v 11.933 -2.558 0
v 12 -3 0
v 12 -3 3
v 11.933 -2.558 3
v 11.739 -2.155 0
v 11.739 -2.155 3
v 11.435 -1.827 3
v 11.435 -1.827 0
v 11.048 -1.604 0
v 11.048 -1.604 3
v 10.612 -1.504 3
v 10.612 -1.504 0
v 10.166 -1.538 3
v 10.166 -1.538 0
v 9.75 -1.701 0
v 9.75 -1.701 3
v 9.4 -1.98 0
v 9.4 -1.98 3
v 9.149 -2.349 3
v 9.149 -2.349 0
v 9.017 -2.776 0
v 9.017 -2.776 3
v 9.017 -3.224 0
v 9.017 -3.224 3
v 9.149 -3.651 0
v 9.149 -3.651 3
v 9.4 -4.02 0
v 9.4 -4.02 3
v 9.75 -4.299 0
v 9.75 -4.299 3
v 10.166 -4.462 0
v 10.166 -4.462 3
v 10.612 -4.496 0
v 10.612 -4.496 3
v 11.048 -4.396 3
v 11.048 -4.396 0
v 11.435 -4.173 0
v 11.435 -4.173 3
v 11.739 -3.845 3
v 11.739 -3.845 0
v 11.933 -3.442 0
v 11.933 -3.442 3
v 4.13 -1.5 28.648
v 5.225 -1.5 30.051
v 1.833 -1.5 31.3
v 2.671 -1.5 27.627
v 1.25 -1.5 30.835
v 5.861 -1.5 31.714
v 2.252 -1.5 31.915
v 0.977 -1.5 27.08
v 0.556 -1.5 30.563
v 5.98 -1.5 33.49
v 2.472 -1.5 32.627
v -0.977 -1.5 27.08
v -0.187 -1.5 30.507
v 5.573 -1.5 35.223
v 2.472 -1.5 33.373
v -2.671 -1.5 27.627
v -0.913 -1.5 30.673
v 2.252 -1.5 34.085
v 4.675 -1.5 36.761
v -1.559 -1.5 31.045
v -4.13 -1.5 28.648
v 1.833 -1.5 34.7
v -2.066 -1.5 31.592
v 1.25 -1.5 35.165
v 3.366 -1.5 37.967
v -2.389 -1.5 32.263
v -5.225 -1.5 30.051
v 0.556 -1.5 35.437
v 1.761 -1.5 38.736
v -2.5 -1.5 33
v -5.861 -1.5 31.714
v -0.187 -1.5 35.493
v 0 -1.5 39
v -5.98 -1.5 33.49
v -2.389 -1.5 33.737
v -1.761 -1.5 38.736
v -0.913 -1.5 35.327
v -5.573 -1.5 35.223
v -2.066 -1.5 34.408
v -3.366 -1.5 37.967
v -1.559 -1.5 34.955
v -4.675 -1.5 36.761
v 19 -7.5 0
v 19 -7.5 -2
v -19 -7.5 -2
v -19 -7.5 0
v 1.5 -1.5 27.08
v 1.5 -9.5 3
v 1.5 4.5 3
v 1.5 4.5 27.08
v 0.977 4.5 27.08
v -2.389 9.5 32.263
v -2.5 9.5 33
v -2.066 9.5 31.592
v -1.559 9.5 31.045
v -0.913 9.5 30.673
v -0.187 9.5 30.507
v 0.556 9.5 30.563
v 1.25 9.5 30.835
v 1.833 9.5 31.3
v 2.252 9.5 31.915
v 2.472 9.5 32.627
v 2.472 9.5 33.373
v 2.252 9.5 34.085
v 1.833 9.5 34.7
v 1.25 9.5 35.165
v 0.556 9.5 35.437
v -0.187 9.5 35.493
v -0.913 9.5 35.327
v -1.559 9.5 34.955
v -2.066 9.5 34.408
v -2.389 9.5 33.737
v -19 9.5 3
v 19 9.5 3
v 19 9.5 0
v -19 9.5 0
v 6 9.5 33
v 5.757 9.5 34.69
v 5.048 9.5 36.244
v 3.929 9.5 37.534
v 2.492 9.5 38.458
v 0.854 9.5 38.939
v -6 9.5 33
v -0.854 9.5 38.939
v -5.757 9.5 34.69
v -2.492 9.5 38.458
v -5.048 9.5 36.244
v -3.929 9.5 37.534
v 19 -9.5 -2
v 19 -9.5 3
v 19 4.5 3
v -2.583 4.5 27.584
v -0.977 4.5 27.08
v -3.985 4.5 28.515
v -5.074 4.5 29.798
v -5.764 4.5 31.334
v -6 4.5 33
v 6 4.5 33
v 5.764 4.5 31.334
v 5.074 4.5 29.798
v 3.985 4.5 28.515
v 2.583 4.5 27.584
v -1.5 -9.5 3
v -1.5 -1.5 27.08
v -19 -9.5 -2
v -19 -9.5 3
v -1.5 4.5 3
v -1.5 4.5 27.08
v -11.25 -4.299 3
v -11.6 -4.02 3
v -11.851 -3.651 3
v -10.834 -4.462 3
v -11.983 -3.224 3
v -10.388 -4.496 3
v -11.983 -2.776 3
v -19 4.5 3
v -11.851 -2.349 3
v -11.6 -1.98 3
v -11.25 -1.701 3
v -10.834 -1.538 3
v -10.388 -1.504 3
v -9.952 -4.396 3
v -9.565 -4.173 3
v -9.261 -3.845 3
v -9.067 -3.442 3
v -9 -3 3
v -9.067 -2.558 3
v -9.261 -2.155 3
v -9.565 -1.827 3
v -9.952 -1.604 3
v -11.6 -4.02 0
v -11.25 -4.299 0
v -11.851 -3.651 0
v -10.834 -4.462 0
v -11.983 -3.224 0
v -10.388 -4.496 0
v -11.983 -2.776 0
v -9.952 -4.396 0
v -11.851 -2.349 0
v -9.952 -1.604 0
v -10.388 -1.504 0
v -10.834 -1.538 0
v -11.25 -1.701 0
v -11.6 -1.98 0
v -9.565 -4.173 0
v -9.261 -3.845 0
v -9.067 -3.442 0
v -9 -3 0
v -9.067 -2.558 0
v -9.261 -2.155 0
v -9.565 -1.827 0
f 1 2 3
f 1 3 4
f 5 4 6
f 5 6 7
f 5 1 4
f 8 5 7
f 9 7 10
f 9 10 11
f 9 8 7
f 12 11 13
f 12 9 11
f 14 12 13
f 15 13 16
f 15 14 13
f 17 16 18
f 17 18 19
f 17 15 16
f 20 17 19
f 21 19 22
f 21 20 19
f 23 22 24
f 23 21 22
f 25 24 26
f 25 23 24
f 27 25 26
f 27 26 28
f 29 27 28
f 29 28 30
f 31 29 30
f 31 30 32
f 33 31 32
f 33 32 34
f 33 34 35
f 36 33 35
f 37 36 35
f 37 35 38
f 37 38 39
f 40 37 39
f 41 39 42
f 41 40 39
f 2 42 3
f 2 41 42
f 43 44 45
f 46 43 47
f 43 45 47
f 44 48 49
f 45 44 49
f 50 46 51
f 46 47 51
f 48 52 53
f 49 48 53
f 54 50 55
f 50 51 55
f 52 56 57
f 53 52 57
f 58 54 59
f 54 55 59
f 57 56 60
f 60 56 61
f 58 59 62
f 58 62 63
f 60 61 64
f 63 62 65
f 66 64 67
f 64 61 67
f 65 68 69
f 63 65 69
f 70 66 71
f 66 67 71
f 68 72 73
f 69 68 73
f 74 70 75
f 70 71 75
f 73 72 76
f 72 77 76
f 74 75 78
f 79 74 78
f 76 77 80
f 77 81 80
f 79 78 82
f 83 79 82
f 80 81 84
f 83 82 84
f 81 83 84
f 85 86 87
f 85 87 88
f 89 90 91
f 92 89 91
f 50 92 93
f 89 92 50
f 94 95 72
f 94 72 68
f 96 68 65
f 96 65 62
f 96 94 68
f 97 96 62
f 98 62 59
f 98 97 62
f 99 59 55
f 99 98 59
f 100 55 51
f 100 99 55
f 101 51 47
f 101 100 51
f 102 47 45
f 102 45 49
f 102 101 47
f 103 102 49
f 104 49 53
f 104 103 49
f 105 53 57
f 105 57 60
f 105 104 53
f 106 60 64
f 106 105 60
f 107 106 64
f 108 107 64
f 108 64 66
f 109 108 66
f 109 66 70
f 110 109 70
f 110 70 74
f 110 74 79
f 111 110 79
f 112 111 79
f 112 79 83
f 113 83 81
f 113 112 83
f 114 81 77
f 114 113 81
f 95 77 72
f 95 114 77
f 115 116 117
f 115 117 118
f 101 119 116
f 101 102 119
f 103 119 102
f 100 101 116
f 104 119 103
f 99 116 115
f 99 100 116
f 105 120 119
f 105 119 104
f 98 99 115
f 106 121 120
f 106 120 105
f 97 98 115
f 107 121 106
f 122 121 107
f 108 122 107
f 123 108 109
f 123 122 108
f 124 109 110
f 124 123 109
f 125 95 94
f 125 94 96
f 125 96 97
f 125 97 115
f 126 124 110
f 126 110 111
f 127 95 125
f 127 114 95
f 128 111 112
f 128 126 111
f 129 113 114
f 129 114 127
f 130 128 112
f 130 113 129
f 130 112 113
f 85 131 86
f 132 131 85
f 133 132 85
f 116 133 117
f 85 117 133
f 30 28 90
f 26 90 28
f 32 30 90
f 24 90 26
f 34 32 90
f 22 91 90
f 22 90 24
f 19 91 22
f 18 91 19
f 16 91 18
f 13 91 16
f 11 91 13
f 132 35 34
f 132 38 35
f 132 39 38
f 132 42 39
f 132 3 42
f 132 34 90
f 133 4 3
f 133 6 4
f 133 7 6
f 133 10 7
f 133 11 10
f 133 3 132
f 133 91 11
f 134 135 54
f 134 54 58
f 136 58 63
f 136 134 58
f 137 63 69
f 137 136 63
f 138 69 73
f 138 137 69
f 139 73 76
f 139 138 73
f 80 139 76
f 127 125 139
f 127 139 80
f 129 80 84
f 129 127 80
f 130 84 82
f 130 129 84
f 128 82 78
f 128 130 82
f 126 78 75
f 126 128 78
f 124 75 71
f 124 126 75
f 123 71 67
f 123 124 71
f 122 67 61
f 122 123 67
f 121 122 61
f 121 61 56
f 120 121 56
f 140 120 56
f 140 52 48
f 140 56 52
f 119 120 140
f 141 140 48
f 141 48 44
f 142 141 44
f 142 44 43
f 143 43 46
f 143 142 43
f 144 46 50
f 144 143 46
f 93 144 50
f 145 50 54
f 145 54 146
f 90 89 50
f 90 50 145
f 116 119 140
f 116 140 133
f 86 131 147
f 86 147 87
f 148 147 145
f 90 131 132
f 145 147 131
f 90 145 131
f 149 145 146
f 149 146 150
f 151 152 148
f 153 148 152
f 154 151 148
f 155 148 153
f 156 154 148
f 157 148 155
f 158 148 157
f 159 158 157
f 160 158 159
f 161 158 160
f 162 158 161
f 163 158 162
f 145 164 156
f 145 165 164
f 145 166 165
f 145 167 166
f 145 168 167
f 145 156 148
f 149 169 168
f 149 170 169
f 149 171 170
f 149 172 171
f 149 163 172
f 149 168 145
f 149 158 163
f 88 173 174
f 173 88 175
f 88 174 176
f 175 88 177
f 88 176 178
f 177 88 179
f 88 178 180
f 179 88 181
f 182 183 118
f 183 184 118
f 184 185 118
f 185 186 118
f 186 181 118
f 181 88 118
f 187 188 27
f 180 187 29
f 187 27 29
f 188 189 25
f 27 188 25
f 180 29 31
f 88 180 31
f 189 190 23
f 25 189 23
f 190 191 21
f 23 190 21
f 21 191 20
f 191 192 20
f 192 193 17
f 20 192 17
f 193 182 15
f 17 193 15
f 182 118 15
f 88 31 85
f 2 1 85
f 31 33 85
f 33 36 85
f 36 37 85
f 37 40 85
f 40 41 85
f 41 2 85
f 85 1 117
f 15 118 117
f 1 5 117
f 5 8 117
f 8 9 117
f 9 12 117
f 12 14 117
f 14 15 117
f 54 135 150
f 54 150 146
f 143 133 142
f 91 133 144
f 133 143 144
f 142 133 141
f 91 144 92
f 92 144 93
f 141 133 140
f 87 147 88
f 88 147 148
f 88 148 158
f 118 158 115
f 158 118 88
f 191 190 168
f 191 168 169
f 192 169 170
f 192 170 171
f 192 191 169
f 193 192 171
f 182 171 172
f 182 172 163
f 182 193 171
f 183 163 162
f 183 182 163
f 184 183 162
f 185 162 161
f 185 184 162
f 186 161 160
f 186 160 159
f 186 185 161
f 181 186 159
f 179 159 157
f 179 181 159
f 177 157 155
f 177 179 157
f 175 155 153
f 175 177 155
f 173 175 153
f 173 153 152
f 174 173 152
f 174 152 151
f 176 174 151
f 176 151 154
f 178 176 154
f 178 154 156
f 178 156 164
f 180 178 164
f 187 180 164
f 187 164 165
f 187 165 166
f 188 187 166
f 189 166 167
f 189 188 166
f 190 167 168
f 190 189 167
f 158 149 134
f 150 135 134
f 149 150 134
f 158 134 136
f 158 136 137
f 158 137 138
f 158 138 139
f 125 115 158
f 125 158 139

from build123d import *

# Parameters (mm, degrees)
F0_W     = 38
F0_H     = 19
F0_R     = 1.5
F1_DEPTH = 3
F2_W     = 2
F2_H     = 2
F3_DEPTH = 38
F5_DEPTH = 5
F6_DEPTH = 11
F8_DEPTH = 1.5


with BuildPart() as f1:
    # F0 (on Top) → F1 (new body)
    with BuildSketch(Plane.XY):
        Rectangle(F0_W, F0_H)
        with Locations((-10.5, -3)):
            Circle(F0_R, mode=Mode.SUBTRACT)
        with Locations((10.5, -3)):
            Circle(F0_R, mode=Mode.SUBTRACT)
    extrude(amount=F1_DEPTH)

    # F2 (on face) → F3 (join)
    with BuildSketch(Plane.YZ.offset(19)):
        with Locations((-8.5, -1)):
            Rectangle(F2_W, F2_H)
    extrude(amount=-F3_DEPTH)

    # F4 (on face) → F5 (join)
    with BuildSketch(Plane(origin=(0, 9.5, 0), x_dir=(-1, 0, 0), z_dir=(0, 1, 0))):
        with BuildLine():
            Line((19, 3), (6, 33))
            ThreePointArc((6, 33), (0, 27), (-6, 33))
            Line((-6, 33), (-19, 3))
            Line((-19, 3), (19, 3))
        make_face()
    extrude(amount=-F5_DEPTH)

    # F4 (on face) → F6 (join)
    with BuildSketch(Plane(origin=(0, 9.5, 0), x_dir=(-1, 0, 0), z_dir=(0, 1, 0))):
        with BuildLine():
            ThreePointArc((-2.5, 33), (0, 35.5), (2.5, 33))
            Line((2.5, 33), (6, 33))
            ThreePointArc((6, 33), (0, 39), (-6, 33))
            Line((-6, 33), (-2.5, 33))
        make_face()
        with BuildLine():
            Line((6, 33), (2.5, 33))
            ThreePointArc((2.5, 33), (0, 30.5), (-2.5, 33))
            Line((-2.5, 33), (-6, 33))
            ThreePointArc((-6, 33), (0, 27), (6, 33))
        make_face()
    extrude(amount=-F6_DEPTH)

    # F7 (on Right) → F8 (join, symmetric)
    with BuildSketch(Plane.YZ):
        Polygon((-1.5, 27.080068), (-9.5, 3), (4.5, 3), (4.5, 27.080068), align=None)
    extrude(amount=F8_DEPTH, both=True)


solid = f1.part
